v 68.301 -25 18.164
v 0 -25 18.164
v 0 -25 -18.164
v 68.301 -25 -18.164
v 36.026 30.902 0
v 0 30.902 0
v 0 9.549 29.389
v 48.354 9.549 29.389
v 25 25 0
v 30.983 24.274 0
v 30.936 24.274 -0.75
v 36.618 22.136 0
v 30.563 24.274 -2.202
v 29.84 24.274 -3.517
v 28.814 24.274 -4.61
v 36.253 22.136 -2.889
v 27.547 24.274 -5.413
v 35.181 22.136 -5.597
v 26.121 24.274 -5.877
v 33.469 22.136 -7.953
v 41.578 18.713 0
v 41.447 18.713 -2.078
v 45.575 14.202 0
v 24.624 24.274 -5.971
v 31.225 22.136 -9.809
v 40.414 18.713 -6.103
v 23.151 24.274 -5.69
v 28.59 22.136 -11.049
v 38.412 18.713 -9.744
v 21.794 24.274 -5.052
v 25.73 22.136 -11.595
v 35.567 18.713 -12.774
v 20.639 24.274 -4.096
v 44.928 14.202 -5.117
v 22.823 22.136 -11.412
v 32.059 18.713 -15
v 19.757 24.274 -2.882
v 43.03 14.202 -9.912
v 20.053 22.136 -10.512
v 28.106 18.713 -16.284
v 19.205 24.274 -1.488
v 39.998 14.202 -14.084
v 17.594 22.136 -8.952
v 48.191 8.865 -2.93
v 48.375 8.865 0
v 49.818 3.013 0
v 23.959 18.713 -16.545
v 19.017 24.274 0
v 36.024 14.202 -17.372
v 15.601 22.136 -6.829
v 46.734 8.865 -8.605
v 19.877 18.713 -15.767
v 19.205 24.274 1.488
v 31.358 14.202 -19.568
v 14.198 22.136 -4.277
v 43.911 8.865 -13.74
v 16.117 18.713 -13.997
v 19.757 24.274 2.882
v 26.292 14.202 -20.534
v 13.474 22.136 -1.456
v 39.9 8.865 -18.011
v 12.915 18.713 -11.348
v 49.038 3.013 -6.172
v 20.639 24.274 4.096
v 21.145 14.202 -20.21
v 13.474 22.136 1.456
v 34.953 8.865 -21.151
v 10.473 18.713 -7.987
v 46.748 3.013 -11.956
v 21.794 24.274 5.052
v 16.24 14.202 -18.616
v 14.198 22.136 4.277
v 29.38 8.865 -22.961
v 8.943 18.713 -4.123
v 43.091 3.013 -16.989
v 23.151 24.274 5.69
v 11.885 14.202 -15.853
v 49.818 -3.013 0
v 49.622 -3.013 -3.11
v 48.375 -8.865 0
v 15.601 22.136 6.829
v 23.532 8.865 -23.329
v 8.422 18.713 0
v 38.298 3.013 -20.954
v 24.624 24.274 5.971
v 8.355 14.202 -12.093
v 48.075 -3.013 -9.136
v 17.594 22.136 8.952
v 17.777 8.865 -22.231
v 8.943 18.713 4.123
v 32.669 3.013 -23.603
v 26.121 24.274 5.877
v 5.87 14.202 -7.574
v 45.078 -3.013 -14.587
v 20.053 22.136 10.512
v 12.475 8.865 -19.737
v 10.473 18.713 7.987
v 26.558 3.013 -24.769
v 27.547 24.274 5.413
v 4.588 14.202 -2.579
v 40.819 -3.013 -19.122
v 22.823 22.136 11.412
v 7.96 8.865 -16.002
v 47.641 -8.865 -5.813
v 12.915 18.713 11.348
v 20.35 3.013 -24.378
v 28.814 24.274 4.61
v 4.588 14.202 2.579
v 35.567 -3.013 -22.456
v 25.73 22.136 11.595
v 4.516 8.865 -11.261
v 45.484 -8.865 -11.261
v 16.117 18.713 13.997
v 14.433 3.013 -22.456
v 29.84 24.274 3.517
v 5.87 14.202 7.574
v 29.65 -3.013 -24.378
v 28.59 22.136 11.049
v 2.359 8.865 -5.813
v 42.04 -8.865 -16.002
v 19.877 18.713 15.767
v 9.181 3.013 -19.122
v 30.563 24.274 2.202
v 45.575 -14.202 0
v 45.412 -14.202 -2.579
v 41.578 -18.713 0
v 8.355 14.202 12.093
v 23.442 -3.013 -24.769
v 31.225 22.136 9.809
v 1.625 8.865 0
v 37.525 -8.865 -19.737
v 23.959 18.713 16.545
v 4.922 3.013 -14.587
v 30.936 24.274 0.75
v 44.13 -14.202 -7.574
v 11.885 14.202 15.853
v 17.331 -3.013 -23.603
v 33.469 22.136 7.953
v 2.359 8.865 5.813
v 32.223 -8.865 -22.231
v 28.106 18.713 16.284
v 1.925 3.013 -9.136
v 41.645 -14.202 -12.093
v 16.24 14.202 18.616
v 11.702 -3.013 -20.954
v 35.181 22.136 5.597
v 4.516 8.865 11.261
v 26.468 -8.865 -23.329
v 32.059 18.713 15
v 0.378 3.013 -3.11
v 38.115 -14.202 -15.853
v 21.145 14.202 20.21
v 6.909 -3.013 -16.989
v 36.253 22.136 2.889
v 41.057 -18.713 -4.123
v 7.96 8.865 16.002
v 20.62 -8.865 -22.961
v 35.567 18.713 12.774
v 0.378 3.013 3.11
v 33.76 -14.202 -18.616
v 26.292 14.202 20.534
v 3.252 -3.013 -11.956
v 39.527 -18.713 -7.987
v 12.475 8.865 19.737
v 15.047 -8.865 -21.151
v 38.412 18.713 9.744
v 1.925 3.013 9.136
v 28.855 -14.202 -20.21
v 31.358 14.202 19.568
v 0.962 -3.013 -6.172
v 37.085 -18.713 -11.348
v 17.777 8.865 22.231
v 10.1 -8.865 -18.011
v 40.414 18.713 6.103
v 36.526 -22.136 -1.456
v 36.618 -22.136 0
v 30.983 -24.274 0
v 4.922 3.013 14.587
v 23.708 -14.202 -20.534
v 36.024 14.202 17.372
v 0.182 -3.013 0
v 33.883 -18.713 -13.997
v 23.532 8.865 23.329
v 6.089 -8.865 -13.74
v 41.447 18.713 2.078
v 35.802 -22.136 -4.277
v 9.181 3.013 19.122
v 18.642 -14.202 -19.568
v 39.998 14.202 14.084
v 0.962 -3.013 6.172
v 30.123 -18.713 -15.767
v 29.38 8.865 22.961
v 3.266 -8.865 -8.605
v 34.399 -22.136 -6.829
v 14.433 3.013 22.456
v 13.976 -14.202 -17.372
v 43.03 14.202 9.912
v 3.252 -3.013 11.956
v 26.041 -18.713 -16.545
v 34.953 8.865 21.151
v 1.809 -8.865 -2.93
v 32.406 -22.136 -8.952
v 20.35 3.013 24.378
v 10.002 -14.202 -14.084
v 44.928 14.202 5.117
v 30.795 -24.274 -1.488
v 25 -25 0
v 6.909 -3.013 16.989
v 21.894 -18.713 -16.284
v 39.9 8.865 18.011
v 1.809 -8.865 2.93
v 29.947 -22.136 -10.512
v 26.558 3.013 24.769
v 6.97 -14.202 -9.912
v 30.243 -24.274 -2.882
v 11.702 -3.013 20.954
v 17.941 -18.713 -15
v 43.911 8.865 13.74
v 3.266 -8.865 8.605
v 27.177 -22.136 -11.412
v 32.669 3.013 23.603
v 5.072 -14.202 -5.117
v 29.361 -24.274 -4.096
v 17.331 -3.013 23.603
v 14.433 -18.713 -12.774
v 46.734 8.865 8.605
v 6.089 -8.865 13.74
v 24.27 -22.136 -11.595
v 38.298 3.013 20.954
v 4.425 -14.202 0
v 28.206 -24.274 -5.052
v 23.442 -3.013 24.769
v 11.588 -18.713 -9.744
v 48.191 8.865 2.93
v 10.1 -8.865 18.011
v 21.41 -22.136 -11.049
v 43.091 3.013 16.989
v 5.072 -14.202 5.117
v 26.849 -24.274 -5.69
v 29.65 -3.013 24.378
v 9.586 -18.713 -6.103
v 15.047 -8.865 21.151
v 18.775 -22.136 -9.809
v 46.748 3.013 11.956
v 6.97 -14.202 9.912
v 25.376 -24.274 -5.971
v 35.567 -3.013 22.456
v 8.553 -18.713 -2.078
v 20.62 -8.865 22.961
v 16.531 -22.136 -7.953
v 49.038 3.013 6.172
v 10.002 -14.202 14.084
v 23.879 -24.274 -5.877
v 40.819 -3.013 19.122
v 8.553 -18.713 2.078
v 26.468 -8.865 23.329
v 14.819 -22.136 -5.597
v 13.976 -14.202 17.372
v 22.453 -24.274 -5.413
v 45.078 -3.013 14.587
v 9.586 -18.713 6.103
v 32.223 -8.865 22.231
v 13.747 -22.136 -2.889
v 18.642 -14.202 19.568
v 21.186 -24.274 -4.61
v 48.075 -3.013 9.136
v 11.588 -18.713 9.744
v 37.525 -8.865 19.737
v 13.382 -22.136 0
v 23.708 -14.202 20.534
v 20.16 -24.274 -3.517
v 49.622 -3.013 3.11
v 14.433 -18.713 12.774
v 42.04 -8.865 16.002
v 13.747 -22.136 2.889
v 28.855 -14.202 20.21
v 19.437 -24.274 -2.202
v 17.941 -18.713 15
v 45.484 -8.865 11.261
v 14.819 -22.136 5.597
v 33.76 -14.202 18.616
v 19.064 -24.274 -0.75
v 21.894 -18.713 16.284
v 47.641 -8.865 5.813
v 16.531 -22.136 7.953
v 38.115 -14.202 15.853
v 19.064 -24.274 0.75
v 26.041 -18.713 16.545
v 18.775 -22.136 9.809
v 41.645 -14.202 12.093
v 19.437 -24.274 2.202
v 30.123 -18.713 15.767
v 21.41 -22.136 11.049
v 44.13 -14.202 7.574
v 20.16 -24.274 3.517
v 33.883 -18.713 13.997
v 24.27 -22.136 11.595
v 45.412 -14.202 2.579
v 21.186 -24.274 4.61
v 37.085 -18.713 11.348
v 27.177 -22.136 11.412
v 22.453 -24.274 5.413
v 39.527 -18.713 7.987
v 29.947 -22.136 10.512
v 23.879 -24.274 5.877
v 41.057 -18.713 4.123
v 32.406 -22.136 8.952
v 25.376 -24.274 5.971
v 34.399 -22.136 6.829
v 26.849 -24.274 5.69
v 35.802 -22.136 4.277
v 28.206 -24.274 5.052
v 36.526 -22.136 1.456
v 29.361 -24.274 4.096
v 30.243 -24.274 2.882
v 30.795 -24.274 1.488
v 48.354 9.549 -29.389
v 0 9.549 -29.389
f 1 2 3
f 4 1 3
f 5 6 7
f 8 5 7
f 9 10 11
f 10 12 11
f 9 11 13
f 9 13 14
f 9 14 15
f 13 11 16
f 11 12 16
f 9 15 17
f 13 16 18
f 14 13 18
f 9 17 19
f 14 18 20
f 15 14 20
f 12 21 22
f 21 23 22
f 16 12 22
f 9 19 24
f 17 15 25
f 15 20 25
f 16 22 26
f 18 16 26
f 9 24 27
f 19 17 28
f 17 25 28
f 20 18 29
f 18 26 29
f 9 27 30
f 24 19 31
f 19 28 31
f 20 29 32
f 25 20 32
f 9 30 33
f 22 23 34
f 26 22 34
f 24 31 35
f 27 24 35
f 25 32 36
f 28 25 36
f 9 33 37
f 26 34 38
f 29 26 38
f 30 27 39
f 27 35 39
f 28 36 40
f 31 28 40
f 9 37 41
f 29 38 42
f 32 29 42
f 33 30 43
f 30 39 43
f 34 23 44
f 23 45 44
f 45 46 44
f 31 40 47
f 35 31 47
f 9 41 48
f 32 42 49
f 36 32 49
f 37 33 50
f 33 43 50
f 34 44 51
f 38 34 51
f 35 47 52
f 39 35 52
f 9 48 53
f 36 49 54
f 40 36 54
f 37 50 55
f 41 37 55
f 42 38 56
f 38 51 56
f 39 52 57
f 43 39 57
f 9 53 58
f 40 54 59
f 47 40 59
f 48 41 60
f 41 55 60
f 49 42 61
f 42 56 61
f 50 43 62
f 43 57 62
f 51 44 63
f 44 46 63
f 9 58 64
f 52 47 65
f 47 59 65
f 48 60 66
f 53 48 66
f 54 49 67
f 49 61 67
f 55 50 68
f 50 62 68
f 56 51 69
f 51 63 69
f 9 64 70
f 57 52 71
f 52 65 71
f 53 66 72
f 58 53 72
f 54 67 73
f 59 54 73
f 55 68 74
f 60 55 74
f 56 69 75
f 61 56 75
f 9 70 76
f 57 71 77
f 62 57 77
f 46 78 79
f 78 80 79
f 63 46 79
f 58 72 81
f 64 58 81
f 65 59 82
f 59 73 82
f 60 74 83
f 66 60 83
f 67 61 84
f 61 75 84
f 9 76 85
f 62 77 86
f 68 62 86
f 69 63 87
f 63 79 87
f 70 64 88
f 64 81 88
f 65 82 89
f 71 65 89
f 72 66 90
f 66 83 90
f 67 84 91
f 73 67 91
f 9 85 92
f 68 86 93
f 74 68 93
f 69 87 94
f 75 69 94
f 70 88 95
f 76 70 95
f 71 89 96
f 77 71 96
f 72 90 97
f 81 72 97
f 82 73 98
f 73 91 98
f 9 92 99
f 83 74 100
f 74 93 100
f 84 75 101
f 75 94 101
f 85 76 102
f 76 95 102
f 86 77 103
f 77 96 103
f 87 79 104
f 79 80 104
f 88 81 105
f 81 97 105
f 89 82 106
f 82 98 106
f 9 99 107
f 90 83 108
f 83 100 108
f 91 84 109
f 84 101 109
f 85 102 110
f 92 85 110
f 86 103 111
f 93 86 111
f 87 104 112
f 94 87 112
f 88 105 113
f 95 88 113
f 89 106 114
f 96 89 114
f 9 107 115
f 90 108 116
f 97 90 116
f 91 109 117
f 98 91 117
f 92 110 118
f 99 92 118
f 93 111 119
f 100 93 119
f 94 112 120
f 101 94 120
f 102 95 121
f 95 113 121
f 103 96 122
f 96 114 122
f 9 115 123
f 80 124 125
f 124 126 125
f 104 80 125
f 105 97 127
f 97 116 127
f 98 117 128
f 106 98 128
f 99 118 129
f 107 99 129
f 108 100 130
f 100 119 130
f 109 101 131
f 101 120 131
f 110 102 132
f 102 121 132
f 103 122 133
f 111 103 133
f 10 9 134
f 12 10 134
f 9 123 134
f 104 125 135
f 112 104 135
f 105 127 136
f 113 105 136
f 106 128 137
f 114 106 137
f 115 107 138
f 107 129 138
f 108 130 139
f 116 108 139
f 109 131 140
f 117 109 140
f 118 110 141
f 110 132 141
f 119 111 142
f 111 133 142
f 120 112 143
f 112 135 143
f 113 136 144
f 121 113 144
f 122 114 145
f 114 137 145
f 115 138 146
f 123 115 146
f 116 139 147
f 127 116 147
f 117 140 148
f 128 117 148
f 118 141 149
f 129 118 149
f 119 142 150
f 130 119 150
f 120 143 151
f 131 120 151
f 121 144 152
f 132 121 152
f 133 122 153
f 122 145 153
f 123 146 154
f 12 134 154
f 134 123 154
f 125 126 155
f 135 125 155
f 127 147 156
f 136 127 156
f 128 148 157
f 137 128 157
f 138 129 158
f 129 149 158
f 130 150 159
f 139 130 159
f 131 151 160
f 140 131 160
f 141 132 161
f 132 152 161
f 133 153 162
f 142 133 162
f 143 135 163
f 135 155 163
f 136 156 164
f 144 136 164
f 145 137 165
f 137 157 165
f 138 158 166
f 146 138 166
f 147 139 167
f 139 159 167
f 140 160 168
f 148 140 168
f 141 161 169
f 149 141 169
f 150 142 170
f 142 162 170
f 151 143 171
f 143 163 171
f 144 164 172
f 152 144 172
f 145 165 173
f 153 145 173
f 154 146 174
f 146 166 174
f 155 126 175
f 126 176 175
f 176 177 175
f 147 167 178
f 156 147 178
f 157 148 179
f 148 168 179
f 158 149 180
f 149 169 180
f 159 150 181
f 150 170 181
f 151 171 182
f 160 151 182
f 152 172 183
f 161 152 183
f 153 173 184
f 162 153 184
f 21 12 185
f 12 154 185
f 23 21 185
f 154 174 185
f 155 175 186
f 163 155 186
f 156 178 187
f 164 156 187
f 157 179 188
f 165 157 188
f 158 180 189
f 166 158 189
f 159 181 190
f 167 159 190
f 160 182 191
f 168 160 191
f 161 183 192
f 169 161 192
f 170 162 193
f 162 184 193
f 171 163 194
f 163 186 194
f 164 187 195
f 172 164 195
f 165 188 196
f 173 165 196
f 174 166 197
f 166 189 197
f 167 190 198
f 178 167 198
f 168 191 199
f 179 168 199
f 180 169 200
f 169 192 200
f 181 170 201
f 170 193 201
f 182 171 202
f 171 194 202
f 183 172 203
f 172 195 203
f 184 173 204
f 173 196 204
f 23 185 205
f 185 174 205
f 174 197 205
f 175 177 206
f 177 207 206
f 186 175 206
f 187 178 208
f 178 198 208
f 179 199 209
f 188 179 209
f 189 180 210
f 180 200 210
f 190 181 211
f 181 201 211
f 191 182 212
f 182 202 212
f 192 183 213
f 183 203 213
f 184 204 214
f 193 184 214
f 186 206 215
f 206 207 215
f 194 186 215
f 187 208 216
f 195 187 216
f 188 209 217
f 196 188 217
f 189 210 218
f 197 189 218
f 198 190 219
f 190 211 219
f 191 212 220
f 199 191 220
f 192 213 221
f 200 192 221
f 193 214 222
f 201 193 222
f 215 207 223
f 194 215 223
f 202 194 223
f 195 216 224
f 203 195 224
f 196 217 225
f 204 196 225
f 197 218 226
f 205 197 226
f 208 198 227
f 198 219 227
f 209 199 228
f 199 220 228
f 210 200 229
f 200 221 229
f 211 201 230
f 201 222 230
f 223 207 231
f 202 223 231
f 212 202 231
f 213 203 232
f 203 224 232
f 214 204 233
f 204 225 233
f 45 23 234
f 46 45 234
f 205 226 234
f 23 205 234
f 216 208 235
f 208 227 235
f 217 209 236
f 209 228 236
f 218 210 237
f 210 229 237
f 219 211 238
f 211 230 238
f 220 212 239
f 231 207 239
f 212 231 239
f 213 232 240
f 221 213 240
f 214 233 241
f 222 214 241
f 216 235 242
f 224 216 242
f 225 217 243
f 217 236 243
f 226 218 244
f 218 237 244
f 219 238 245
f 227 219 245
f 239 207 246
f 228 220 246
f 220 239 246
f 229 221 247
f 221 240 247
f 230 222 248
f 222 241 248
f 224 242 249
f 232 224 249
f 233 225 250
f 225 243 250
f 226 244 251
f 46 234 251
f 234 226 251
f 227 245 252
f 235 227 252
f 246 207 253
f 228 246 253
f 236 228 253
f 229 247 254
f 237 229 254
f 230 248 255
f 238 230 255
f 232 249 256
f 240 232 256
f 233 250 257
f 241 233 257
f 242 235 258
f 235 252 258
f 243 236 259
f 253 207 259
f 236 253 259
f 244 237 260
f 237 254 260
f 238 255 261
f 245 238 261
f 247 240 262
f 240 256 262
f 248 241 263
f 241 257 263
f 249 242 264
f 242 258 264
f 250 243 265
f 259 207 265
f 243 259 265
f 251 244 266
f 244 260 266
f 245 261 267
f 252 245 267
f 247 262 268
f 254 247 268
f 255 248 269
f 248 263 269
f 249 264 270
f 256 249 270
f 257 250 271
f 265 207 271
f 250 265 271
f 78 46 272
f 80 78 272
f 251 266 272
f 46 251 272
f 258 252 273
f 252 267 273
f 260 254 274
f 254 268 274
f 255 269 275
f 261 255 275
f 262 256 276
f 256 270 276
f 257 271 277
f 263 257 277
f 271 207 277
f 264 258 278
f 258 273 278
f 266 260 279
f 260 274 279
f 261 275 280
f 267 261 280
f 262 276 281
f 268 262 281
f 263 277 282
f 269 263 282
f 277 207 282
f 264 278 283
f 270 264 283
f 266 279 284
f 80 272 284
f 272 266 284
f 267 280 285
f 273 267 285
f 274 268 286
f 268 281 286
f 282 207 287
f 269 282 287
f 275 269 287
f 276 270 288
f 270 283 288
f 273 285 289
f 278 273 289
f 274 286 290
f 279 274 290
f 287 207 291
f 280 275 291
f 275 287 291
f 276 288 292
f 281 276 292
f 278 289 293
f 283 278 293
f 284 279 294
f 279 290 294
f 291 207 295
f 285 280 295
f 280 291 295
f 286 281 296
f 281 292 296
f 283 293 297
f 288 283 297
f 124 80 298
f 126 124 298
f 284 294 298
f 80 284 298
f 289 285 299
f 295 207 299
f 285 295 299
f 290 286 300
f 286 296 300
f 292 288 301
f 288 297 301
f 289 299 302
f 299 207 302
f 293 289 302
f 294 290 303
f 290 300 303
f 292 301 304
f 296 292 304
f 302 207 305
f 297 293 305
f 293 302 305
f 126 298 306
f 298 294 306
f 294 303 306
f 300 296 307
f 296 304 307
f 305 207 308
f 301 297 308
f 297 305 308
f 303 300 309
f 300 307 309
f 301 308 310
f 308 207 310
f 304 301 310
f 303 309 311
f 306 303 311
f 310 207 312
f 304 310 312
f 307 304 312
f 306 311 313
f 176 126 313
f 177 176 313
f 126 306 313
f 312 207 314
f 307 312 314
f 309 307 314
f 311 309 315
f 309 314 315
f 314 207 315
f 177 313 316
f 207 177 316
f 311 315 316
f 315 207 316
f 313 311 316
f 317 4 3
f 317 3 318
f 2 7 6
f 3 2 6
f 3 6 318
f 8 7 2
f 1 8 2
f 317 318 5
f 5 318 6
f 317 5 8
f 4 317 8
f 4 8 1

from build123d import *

# Parameters (mm, degrees)
EXTRUDE1_DEPTH     = 70
CUT_EXTRUDE1_DEPTH = 30


with BuildPart() as part:
    # Sketch1 → Extrude1 (new body)
    with BuildSketch(Plane(origin=(0, 0, 0), x_dir=(0, 0, -1), z_dir=(1, 0, 0))):
        Polygon((18.1635632, -25), (29.389262615, 9.549150281), (0, 30.901699437), (-29.389262615, 9.549150281), (-18.1635632, -25), align=None)
    extrude(amount=EXTRUDE1_DEPTH)

    # Sketch3 → Cut-Extrude1 (cut, symmetric)
    with BuildSketch(Plane.XY):
        Polygon((70, 30.901699437), (36.026408971, 30.901699437), (68.301270189, -25), (70, -25), align=None)
    extrude(amount=CUT_EXTRUDE1_DEPTH, both=True, mode=Mode.SUBTRACT)


with BuildPart() as body_2:
    # Sketch2 → Revolve1 (revolve)
    with BuildSketch(Plane.XY):
        with BuildLine():
            Line((25, -25), (25, 25))
            ThreePointArc((25, 25), (50, 0), (25, -25))
        make_face()
    revolve(axis=Axis((25, -25, 0), (0, 1, 0)))


solid = Compound([part.part, body_2.part])
